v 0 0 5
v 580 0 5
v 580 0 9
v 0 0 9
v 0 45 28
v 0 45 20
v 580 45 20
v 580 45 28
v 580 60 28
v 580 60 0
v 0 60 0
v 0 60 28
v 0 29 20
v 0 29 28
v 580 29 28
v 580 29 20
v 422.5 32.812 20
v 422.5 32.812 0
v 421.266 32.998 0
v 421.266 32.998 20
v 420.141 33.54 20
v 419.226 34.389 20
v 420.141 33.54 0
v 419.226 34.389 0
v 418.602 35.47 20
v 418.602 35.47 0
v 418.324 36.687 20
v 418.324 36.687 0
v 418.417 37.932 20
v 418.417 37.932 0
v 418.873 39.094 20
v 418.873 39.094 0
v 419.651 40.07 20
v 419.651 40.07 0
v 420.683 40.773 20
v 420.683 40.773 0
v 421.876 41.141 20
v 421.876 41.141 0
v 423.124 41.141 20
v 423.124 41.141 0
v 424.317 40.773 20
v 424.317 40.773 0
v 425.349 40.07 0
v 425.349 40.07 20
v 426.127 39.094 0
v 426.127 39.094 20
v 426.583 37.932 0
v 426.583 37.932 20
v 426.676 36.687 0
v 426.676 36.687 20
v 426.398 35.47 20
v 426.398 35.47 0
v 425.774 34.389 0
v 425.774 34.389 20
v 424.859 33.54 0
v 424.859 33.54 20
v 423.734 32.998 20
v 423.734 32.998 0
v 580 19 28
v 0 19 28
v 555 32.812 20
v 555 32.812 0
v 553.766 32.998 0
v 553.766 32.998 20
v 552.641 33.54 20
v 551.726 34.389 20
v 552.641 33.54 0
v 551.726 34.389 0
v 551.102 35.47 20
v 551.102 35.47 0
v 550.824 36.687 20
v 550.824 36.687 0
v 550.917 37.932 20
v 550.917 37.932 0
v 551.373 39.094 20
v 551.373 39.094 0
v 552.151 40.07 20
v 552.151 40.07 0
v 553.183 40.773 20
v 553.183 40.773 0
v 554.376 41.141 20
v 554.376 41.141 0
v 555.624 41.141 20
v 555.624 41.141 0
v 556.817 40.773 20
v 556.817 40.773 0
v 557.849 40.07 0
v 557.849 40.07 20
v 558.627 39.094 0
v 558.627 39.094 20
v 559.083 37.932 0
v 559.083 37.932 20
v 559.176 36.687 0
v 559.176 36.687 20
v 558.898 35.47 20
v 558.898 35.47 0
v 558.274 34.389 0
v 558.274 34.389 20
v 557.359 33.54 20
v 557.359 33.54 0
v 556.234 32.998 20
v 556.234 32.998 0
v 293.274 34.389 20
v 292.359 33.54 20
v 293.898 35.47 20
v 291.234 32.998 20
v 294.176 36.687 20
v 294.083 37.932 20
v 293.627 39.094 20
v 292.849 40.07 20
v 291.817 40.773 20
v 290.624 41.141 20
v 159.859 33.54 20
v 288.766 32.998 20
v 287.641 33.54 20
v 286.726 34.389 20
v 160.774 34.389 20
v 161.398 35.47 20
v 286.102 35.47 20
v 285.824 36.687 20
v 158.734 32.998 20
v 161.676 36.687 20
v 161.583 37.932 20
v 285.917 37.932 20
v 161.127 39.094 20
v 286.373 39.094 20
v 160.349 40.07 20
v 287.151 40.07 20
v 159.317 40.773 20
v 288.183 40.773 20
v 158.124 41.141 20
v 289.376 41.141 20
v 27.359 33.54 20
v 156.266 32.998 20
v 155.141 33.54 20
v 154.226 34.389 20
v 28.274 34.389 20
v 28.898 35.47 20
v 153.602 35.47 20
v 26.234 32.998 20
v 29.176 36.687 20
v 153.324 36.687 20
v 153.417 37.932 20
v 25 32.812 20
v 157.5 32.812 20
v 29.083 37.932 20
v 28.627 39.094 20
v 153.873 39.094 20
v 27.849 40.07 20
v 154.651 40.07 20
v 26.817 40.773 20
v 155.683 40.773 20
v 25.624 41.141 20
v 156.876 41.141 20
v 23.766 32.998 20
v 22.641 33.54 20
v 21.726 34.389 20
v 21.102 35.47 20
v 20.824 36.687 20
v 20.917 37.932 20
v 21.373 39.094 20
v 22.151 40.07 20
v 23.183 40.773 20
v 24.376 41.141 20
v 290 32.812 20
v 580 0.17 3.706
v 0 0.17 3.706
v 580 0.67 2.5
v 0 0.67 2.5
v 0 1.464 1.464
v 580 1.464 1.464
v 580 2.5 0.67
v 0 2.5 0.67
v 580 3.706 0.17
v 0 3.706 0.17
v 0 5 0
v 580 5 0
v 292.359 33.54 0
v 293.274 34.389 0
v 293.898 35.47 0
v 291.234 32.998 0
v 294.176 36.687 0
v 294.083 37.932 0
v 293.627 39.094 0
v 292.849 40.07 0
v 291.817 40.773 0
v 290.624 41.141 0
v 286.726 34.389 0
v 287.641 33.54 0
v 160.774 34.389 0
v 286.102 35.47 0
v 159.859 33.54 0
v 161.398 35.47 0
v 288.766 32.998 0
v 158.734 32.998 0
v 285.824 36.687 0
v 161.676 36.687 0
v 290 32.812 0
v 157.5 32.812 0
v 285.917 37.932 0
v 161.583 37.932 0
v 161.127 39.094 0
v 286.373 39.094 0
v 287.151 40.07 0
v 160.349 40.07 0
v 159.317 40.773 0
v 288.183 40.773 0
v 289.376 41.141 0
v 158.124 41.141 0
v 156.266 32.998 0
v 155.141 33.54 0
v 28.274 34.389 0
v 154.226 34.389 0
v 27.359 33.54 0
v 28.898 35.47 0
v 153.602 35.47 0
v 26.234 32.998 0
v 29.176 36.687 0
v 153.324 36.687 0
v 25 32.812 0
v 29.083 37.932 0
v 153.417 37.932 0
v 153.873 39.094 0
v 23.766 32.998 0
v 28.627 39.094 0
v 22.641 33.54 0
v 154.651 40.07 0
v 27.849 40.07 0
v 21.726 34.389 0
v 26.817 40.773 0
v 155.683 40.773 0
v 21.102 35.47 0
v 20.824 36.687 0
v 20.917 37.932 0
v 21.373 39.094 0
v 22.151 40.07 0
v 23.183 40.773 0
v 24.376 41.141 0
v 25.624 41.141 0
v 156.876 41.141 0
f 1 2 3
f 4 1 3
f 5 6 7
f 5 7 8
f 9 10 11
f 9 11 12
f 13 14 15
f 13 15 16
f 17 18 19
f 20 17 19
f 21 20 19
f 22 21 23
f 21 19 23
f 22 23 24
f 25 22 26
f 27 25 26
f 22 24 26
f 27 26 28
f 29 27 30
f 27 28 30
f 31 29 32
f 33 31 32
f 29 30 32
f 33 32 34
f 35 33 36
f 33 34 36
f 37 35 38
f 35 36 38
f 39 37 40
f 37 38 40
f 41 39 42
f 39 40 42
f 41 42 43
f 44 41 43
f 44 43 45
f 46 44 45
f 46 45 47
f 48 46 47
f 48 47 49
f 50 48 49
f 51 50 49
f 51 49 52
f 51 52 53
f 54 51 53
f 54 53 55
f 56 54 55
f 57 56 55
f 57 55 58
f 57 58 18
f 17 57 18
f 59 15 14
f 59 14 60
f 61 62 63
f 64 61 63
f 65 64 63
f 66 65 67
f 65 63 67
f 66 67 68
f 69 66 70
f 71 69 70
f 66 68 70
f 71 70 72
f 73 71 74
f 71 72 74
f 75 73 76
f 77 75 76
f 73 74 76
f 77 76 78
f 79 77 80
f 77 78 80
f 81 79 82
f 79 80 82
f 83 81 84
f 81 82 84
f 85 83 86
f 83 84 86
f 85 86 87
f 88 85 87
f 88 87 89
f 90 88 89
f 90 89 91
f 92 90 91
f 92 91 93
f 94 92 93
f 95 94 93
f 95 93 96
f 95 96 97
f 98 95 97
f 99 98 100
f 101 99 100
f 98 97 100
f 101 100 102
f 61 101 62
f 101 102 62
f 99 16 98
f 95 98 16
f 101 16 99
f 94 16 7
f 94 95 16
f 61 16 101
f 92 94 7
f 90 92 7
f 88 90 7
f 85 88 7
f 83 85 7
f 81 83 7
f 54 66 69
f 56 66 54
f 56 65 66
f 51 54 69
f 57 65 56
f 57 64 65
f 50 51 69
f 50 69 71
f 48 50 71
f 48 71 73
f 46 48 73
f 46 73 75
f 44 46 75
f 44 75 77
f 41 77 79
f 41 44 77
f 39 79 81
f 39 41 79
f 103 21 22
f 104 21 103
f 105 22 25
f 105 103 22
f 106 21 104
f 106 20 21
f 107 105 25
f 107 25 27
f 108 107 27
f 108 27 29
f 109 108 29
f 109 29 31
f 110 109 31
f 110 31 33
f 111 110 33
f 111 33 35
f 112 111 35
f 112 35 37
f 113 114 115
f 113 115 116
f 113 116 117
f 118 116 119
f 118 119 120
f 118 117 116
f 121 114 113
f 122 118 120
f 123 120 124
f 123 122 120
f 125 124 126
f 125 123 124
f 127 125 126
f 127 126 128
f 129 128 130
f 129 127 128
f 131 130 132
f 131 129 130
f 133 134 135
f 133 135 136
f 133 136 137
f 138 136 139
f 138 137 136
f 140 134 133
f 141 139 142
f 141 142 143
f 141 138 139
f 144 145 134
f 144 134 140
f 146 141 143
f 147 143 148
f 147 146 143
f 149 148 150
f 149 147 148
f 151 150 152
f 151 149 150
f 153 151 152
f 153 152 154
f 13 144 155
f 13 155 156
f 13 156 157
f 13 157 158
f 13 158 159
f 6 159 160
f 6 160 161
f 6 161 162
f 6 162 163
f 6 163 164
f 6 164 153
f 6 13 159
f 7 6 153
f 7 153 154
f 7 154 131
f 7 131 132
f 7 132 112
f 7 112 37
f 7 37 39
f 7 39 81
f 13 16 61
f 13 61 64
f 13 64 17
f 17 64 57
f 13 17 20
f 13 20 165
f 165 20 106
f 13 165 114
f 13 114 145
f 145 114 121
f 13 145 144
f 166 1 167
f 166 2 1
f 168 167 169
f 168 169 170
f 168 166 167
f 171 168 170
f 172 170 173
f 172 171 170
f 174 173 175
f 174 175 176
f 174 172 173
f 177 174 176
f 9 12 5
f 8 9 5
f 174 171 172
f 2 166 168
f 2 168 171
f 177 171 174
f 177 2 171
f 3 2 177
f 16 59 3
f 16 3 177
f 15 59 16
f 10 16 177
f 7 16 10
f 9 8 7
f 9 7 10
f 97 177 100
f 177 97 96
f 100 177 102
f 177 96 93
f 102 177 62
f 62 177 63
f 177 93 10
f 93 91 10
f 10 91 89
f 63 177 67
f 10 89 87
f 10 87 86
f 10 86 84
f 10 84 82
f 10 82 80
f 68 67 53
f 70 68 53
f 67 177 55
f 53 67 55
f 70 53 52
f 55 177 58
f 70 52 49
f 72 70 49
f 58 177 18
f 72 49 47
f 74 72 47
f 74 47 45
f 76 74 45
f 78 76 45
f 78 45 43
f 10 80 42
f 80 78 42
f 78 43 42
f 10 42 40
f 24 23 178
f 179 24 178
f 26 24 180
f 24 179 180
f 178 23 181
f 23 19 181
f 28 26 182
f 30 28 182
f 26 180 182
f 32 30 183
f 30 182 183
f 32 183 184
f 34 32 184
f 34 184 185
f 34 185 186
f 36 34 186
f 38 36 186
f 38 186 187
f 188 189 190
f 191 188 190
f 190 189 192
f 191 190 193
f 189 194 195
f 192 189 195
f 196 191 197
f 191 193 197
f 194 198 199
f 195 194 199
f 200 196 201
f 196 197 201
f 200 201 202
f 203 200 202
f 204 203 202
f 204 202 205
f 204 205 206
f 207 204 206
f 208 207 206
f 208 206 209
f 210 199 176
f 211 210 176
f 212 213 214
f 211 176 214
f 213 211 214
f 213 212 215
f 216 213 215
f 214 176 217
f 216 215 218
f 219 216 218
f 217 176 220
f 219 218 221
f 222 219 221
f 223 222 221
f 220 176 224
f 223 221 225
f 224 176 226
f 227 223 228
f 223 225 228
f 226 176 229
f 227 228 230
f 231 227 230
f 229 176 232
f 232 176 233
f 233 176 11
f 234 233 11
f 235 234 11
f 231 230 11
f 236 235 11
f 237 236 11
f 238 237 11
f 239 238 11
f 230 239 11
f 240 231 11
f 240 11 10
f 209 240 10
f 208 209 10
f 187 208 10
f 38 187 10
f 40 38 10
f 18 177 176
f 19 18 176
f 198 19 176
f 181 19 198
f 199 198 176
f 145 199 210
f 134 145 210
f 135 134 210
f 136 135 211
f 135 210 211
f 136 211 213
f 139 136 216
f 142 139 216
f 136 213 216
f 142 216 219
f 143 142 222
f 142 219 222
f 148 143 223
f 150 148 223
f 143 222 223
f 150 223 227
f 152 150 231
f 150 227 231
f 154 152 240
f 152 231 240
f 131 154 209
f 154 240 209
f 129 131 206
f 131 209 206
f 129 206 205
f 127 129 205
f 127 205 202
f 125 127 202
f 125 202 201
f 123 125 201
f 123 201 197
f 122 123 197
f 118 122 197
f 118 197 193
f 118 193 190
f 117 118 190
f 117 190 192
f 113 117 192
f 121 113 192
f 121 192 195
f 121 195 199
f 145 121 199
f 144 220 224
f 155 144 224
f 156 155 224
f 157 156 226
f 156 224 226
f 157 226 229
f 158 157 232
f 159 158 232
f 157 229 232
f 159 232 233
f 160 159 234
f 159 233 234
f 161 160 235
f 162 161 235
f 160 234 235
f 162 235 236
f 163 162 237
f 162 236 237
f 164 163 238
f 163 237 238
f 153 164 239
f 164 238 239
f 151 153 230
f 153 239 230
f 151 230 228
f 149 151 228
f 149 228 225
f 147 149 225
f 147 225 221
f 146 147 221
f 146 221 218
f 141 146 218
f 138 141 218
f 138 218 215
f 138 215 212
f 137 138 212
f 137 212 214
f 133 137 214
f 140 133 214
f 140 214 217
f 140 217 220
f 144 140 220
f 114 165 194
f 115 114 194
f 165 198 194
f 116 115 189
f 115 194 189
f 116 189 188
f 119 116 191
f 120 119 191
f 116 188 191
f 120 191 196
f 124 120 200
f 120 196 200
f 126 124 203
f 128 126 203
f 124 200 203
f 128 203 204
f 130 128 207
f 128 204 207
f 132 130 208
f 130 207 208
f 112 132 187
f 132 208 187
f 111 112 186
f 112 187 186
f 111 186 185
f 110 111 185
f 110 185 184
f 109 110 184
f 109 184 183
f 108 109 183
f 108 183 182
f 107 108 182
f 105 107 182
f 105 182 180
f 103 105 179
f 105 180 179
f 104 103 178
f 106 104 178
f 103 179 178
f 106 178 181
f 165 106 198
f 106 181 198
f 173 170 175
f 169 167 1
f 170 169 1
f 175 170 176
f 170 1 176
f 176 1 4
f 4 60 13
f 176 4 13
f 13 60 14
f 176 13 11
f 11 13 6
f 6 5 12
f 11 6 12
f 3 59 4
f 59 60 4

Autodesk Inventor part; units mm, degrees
ref_plane "YZ Plane" through (0, 0, 0) normal (1, 0, 0) x (0, 1, 0)
ref_plane "XZ Plane" through (0, 0, 0) normal (0, 1, 0) x (-1, 0, 0)
ref_plane "XY Plane" through (0, 0, 0) normal (0, 0, 1) x (1, 0, 0)
sketch "草圖1" plane through (0, 0, 0) normal (1, 0, 0) x (0, 1, 0)
  line L0 (-12, 0) -> (72, 0) projected
  line L1 (0, -5.6) -> (0, 33.6) projected
  line L2 (0, 0) -> (60, 0)
  line L3 (60, 0) -> (60, 28)
  line L4 (0, 9) -> (0, 0)
  line L5 (45, 28) -> (29, 28)
  line L6 (29, 28) -> (29, 20)
  line L7 (29, 20) -> (45, 20)
  line L8 (45, 20) -> (45, 28)
  line L9 (19, 28) -> (0, 9)
  line L10 (60, 28) -> (19, 28)
  dimension "d1" = 28
  dimension "d2" = 15
  dimension "d3" = 8
  dimension "d4" = 16
  dimension "d6" = 10
extrude "擠出1" add sketch "草圖1" along normal blind 580 contours L1 L9 L10 L6 L7 L8 L3 L0
fillet "圓角1" radius 5 1 edges at (290, 0, 0)
sketch "草圖2" plane through (0, 29, 20) normal (0, 0, 1) x (1, 0, 0)
  line L0 (-116, -29) -> (696, -29) projected
  line L1 (0, -41) -> (0, 43) projected
  line L2 (0, 31) -> (580, 31) projected
  line L3 (0, 8) -> (580, 8)
  point P0 (0, -29)
  point P1 (555, 8)
  point P2 (422.5, 8)
  point P3 (290, 8)
  point P4 (157.5, 8)
  point P5 (25, 8)
  point P6 (580, 0)
  dimension "d10" = 23
  dimension "d11" = 25
  dimension "d12" = 132.5
  dimension "d13" = 132.5
  dimension "d14" = 132.5
  dimension "d15" = 132.5
hole "孔1" at (555, 37, 20) at (422.5, 37, 20) at (290, 37, 20) at (157.5, 37, 20) at (25, 37, 20) at (580, 29, 20) direction (0, 0, -1) diameter 8.376 end through all thread size "M10x1.5" class "6H" standard "ISO Metric profile"
delete faces "刪除面1" heal yes whole lump no faces at (575.812, 29, 6.6667)
properties part number "exercise3-13"
